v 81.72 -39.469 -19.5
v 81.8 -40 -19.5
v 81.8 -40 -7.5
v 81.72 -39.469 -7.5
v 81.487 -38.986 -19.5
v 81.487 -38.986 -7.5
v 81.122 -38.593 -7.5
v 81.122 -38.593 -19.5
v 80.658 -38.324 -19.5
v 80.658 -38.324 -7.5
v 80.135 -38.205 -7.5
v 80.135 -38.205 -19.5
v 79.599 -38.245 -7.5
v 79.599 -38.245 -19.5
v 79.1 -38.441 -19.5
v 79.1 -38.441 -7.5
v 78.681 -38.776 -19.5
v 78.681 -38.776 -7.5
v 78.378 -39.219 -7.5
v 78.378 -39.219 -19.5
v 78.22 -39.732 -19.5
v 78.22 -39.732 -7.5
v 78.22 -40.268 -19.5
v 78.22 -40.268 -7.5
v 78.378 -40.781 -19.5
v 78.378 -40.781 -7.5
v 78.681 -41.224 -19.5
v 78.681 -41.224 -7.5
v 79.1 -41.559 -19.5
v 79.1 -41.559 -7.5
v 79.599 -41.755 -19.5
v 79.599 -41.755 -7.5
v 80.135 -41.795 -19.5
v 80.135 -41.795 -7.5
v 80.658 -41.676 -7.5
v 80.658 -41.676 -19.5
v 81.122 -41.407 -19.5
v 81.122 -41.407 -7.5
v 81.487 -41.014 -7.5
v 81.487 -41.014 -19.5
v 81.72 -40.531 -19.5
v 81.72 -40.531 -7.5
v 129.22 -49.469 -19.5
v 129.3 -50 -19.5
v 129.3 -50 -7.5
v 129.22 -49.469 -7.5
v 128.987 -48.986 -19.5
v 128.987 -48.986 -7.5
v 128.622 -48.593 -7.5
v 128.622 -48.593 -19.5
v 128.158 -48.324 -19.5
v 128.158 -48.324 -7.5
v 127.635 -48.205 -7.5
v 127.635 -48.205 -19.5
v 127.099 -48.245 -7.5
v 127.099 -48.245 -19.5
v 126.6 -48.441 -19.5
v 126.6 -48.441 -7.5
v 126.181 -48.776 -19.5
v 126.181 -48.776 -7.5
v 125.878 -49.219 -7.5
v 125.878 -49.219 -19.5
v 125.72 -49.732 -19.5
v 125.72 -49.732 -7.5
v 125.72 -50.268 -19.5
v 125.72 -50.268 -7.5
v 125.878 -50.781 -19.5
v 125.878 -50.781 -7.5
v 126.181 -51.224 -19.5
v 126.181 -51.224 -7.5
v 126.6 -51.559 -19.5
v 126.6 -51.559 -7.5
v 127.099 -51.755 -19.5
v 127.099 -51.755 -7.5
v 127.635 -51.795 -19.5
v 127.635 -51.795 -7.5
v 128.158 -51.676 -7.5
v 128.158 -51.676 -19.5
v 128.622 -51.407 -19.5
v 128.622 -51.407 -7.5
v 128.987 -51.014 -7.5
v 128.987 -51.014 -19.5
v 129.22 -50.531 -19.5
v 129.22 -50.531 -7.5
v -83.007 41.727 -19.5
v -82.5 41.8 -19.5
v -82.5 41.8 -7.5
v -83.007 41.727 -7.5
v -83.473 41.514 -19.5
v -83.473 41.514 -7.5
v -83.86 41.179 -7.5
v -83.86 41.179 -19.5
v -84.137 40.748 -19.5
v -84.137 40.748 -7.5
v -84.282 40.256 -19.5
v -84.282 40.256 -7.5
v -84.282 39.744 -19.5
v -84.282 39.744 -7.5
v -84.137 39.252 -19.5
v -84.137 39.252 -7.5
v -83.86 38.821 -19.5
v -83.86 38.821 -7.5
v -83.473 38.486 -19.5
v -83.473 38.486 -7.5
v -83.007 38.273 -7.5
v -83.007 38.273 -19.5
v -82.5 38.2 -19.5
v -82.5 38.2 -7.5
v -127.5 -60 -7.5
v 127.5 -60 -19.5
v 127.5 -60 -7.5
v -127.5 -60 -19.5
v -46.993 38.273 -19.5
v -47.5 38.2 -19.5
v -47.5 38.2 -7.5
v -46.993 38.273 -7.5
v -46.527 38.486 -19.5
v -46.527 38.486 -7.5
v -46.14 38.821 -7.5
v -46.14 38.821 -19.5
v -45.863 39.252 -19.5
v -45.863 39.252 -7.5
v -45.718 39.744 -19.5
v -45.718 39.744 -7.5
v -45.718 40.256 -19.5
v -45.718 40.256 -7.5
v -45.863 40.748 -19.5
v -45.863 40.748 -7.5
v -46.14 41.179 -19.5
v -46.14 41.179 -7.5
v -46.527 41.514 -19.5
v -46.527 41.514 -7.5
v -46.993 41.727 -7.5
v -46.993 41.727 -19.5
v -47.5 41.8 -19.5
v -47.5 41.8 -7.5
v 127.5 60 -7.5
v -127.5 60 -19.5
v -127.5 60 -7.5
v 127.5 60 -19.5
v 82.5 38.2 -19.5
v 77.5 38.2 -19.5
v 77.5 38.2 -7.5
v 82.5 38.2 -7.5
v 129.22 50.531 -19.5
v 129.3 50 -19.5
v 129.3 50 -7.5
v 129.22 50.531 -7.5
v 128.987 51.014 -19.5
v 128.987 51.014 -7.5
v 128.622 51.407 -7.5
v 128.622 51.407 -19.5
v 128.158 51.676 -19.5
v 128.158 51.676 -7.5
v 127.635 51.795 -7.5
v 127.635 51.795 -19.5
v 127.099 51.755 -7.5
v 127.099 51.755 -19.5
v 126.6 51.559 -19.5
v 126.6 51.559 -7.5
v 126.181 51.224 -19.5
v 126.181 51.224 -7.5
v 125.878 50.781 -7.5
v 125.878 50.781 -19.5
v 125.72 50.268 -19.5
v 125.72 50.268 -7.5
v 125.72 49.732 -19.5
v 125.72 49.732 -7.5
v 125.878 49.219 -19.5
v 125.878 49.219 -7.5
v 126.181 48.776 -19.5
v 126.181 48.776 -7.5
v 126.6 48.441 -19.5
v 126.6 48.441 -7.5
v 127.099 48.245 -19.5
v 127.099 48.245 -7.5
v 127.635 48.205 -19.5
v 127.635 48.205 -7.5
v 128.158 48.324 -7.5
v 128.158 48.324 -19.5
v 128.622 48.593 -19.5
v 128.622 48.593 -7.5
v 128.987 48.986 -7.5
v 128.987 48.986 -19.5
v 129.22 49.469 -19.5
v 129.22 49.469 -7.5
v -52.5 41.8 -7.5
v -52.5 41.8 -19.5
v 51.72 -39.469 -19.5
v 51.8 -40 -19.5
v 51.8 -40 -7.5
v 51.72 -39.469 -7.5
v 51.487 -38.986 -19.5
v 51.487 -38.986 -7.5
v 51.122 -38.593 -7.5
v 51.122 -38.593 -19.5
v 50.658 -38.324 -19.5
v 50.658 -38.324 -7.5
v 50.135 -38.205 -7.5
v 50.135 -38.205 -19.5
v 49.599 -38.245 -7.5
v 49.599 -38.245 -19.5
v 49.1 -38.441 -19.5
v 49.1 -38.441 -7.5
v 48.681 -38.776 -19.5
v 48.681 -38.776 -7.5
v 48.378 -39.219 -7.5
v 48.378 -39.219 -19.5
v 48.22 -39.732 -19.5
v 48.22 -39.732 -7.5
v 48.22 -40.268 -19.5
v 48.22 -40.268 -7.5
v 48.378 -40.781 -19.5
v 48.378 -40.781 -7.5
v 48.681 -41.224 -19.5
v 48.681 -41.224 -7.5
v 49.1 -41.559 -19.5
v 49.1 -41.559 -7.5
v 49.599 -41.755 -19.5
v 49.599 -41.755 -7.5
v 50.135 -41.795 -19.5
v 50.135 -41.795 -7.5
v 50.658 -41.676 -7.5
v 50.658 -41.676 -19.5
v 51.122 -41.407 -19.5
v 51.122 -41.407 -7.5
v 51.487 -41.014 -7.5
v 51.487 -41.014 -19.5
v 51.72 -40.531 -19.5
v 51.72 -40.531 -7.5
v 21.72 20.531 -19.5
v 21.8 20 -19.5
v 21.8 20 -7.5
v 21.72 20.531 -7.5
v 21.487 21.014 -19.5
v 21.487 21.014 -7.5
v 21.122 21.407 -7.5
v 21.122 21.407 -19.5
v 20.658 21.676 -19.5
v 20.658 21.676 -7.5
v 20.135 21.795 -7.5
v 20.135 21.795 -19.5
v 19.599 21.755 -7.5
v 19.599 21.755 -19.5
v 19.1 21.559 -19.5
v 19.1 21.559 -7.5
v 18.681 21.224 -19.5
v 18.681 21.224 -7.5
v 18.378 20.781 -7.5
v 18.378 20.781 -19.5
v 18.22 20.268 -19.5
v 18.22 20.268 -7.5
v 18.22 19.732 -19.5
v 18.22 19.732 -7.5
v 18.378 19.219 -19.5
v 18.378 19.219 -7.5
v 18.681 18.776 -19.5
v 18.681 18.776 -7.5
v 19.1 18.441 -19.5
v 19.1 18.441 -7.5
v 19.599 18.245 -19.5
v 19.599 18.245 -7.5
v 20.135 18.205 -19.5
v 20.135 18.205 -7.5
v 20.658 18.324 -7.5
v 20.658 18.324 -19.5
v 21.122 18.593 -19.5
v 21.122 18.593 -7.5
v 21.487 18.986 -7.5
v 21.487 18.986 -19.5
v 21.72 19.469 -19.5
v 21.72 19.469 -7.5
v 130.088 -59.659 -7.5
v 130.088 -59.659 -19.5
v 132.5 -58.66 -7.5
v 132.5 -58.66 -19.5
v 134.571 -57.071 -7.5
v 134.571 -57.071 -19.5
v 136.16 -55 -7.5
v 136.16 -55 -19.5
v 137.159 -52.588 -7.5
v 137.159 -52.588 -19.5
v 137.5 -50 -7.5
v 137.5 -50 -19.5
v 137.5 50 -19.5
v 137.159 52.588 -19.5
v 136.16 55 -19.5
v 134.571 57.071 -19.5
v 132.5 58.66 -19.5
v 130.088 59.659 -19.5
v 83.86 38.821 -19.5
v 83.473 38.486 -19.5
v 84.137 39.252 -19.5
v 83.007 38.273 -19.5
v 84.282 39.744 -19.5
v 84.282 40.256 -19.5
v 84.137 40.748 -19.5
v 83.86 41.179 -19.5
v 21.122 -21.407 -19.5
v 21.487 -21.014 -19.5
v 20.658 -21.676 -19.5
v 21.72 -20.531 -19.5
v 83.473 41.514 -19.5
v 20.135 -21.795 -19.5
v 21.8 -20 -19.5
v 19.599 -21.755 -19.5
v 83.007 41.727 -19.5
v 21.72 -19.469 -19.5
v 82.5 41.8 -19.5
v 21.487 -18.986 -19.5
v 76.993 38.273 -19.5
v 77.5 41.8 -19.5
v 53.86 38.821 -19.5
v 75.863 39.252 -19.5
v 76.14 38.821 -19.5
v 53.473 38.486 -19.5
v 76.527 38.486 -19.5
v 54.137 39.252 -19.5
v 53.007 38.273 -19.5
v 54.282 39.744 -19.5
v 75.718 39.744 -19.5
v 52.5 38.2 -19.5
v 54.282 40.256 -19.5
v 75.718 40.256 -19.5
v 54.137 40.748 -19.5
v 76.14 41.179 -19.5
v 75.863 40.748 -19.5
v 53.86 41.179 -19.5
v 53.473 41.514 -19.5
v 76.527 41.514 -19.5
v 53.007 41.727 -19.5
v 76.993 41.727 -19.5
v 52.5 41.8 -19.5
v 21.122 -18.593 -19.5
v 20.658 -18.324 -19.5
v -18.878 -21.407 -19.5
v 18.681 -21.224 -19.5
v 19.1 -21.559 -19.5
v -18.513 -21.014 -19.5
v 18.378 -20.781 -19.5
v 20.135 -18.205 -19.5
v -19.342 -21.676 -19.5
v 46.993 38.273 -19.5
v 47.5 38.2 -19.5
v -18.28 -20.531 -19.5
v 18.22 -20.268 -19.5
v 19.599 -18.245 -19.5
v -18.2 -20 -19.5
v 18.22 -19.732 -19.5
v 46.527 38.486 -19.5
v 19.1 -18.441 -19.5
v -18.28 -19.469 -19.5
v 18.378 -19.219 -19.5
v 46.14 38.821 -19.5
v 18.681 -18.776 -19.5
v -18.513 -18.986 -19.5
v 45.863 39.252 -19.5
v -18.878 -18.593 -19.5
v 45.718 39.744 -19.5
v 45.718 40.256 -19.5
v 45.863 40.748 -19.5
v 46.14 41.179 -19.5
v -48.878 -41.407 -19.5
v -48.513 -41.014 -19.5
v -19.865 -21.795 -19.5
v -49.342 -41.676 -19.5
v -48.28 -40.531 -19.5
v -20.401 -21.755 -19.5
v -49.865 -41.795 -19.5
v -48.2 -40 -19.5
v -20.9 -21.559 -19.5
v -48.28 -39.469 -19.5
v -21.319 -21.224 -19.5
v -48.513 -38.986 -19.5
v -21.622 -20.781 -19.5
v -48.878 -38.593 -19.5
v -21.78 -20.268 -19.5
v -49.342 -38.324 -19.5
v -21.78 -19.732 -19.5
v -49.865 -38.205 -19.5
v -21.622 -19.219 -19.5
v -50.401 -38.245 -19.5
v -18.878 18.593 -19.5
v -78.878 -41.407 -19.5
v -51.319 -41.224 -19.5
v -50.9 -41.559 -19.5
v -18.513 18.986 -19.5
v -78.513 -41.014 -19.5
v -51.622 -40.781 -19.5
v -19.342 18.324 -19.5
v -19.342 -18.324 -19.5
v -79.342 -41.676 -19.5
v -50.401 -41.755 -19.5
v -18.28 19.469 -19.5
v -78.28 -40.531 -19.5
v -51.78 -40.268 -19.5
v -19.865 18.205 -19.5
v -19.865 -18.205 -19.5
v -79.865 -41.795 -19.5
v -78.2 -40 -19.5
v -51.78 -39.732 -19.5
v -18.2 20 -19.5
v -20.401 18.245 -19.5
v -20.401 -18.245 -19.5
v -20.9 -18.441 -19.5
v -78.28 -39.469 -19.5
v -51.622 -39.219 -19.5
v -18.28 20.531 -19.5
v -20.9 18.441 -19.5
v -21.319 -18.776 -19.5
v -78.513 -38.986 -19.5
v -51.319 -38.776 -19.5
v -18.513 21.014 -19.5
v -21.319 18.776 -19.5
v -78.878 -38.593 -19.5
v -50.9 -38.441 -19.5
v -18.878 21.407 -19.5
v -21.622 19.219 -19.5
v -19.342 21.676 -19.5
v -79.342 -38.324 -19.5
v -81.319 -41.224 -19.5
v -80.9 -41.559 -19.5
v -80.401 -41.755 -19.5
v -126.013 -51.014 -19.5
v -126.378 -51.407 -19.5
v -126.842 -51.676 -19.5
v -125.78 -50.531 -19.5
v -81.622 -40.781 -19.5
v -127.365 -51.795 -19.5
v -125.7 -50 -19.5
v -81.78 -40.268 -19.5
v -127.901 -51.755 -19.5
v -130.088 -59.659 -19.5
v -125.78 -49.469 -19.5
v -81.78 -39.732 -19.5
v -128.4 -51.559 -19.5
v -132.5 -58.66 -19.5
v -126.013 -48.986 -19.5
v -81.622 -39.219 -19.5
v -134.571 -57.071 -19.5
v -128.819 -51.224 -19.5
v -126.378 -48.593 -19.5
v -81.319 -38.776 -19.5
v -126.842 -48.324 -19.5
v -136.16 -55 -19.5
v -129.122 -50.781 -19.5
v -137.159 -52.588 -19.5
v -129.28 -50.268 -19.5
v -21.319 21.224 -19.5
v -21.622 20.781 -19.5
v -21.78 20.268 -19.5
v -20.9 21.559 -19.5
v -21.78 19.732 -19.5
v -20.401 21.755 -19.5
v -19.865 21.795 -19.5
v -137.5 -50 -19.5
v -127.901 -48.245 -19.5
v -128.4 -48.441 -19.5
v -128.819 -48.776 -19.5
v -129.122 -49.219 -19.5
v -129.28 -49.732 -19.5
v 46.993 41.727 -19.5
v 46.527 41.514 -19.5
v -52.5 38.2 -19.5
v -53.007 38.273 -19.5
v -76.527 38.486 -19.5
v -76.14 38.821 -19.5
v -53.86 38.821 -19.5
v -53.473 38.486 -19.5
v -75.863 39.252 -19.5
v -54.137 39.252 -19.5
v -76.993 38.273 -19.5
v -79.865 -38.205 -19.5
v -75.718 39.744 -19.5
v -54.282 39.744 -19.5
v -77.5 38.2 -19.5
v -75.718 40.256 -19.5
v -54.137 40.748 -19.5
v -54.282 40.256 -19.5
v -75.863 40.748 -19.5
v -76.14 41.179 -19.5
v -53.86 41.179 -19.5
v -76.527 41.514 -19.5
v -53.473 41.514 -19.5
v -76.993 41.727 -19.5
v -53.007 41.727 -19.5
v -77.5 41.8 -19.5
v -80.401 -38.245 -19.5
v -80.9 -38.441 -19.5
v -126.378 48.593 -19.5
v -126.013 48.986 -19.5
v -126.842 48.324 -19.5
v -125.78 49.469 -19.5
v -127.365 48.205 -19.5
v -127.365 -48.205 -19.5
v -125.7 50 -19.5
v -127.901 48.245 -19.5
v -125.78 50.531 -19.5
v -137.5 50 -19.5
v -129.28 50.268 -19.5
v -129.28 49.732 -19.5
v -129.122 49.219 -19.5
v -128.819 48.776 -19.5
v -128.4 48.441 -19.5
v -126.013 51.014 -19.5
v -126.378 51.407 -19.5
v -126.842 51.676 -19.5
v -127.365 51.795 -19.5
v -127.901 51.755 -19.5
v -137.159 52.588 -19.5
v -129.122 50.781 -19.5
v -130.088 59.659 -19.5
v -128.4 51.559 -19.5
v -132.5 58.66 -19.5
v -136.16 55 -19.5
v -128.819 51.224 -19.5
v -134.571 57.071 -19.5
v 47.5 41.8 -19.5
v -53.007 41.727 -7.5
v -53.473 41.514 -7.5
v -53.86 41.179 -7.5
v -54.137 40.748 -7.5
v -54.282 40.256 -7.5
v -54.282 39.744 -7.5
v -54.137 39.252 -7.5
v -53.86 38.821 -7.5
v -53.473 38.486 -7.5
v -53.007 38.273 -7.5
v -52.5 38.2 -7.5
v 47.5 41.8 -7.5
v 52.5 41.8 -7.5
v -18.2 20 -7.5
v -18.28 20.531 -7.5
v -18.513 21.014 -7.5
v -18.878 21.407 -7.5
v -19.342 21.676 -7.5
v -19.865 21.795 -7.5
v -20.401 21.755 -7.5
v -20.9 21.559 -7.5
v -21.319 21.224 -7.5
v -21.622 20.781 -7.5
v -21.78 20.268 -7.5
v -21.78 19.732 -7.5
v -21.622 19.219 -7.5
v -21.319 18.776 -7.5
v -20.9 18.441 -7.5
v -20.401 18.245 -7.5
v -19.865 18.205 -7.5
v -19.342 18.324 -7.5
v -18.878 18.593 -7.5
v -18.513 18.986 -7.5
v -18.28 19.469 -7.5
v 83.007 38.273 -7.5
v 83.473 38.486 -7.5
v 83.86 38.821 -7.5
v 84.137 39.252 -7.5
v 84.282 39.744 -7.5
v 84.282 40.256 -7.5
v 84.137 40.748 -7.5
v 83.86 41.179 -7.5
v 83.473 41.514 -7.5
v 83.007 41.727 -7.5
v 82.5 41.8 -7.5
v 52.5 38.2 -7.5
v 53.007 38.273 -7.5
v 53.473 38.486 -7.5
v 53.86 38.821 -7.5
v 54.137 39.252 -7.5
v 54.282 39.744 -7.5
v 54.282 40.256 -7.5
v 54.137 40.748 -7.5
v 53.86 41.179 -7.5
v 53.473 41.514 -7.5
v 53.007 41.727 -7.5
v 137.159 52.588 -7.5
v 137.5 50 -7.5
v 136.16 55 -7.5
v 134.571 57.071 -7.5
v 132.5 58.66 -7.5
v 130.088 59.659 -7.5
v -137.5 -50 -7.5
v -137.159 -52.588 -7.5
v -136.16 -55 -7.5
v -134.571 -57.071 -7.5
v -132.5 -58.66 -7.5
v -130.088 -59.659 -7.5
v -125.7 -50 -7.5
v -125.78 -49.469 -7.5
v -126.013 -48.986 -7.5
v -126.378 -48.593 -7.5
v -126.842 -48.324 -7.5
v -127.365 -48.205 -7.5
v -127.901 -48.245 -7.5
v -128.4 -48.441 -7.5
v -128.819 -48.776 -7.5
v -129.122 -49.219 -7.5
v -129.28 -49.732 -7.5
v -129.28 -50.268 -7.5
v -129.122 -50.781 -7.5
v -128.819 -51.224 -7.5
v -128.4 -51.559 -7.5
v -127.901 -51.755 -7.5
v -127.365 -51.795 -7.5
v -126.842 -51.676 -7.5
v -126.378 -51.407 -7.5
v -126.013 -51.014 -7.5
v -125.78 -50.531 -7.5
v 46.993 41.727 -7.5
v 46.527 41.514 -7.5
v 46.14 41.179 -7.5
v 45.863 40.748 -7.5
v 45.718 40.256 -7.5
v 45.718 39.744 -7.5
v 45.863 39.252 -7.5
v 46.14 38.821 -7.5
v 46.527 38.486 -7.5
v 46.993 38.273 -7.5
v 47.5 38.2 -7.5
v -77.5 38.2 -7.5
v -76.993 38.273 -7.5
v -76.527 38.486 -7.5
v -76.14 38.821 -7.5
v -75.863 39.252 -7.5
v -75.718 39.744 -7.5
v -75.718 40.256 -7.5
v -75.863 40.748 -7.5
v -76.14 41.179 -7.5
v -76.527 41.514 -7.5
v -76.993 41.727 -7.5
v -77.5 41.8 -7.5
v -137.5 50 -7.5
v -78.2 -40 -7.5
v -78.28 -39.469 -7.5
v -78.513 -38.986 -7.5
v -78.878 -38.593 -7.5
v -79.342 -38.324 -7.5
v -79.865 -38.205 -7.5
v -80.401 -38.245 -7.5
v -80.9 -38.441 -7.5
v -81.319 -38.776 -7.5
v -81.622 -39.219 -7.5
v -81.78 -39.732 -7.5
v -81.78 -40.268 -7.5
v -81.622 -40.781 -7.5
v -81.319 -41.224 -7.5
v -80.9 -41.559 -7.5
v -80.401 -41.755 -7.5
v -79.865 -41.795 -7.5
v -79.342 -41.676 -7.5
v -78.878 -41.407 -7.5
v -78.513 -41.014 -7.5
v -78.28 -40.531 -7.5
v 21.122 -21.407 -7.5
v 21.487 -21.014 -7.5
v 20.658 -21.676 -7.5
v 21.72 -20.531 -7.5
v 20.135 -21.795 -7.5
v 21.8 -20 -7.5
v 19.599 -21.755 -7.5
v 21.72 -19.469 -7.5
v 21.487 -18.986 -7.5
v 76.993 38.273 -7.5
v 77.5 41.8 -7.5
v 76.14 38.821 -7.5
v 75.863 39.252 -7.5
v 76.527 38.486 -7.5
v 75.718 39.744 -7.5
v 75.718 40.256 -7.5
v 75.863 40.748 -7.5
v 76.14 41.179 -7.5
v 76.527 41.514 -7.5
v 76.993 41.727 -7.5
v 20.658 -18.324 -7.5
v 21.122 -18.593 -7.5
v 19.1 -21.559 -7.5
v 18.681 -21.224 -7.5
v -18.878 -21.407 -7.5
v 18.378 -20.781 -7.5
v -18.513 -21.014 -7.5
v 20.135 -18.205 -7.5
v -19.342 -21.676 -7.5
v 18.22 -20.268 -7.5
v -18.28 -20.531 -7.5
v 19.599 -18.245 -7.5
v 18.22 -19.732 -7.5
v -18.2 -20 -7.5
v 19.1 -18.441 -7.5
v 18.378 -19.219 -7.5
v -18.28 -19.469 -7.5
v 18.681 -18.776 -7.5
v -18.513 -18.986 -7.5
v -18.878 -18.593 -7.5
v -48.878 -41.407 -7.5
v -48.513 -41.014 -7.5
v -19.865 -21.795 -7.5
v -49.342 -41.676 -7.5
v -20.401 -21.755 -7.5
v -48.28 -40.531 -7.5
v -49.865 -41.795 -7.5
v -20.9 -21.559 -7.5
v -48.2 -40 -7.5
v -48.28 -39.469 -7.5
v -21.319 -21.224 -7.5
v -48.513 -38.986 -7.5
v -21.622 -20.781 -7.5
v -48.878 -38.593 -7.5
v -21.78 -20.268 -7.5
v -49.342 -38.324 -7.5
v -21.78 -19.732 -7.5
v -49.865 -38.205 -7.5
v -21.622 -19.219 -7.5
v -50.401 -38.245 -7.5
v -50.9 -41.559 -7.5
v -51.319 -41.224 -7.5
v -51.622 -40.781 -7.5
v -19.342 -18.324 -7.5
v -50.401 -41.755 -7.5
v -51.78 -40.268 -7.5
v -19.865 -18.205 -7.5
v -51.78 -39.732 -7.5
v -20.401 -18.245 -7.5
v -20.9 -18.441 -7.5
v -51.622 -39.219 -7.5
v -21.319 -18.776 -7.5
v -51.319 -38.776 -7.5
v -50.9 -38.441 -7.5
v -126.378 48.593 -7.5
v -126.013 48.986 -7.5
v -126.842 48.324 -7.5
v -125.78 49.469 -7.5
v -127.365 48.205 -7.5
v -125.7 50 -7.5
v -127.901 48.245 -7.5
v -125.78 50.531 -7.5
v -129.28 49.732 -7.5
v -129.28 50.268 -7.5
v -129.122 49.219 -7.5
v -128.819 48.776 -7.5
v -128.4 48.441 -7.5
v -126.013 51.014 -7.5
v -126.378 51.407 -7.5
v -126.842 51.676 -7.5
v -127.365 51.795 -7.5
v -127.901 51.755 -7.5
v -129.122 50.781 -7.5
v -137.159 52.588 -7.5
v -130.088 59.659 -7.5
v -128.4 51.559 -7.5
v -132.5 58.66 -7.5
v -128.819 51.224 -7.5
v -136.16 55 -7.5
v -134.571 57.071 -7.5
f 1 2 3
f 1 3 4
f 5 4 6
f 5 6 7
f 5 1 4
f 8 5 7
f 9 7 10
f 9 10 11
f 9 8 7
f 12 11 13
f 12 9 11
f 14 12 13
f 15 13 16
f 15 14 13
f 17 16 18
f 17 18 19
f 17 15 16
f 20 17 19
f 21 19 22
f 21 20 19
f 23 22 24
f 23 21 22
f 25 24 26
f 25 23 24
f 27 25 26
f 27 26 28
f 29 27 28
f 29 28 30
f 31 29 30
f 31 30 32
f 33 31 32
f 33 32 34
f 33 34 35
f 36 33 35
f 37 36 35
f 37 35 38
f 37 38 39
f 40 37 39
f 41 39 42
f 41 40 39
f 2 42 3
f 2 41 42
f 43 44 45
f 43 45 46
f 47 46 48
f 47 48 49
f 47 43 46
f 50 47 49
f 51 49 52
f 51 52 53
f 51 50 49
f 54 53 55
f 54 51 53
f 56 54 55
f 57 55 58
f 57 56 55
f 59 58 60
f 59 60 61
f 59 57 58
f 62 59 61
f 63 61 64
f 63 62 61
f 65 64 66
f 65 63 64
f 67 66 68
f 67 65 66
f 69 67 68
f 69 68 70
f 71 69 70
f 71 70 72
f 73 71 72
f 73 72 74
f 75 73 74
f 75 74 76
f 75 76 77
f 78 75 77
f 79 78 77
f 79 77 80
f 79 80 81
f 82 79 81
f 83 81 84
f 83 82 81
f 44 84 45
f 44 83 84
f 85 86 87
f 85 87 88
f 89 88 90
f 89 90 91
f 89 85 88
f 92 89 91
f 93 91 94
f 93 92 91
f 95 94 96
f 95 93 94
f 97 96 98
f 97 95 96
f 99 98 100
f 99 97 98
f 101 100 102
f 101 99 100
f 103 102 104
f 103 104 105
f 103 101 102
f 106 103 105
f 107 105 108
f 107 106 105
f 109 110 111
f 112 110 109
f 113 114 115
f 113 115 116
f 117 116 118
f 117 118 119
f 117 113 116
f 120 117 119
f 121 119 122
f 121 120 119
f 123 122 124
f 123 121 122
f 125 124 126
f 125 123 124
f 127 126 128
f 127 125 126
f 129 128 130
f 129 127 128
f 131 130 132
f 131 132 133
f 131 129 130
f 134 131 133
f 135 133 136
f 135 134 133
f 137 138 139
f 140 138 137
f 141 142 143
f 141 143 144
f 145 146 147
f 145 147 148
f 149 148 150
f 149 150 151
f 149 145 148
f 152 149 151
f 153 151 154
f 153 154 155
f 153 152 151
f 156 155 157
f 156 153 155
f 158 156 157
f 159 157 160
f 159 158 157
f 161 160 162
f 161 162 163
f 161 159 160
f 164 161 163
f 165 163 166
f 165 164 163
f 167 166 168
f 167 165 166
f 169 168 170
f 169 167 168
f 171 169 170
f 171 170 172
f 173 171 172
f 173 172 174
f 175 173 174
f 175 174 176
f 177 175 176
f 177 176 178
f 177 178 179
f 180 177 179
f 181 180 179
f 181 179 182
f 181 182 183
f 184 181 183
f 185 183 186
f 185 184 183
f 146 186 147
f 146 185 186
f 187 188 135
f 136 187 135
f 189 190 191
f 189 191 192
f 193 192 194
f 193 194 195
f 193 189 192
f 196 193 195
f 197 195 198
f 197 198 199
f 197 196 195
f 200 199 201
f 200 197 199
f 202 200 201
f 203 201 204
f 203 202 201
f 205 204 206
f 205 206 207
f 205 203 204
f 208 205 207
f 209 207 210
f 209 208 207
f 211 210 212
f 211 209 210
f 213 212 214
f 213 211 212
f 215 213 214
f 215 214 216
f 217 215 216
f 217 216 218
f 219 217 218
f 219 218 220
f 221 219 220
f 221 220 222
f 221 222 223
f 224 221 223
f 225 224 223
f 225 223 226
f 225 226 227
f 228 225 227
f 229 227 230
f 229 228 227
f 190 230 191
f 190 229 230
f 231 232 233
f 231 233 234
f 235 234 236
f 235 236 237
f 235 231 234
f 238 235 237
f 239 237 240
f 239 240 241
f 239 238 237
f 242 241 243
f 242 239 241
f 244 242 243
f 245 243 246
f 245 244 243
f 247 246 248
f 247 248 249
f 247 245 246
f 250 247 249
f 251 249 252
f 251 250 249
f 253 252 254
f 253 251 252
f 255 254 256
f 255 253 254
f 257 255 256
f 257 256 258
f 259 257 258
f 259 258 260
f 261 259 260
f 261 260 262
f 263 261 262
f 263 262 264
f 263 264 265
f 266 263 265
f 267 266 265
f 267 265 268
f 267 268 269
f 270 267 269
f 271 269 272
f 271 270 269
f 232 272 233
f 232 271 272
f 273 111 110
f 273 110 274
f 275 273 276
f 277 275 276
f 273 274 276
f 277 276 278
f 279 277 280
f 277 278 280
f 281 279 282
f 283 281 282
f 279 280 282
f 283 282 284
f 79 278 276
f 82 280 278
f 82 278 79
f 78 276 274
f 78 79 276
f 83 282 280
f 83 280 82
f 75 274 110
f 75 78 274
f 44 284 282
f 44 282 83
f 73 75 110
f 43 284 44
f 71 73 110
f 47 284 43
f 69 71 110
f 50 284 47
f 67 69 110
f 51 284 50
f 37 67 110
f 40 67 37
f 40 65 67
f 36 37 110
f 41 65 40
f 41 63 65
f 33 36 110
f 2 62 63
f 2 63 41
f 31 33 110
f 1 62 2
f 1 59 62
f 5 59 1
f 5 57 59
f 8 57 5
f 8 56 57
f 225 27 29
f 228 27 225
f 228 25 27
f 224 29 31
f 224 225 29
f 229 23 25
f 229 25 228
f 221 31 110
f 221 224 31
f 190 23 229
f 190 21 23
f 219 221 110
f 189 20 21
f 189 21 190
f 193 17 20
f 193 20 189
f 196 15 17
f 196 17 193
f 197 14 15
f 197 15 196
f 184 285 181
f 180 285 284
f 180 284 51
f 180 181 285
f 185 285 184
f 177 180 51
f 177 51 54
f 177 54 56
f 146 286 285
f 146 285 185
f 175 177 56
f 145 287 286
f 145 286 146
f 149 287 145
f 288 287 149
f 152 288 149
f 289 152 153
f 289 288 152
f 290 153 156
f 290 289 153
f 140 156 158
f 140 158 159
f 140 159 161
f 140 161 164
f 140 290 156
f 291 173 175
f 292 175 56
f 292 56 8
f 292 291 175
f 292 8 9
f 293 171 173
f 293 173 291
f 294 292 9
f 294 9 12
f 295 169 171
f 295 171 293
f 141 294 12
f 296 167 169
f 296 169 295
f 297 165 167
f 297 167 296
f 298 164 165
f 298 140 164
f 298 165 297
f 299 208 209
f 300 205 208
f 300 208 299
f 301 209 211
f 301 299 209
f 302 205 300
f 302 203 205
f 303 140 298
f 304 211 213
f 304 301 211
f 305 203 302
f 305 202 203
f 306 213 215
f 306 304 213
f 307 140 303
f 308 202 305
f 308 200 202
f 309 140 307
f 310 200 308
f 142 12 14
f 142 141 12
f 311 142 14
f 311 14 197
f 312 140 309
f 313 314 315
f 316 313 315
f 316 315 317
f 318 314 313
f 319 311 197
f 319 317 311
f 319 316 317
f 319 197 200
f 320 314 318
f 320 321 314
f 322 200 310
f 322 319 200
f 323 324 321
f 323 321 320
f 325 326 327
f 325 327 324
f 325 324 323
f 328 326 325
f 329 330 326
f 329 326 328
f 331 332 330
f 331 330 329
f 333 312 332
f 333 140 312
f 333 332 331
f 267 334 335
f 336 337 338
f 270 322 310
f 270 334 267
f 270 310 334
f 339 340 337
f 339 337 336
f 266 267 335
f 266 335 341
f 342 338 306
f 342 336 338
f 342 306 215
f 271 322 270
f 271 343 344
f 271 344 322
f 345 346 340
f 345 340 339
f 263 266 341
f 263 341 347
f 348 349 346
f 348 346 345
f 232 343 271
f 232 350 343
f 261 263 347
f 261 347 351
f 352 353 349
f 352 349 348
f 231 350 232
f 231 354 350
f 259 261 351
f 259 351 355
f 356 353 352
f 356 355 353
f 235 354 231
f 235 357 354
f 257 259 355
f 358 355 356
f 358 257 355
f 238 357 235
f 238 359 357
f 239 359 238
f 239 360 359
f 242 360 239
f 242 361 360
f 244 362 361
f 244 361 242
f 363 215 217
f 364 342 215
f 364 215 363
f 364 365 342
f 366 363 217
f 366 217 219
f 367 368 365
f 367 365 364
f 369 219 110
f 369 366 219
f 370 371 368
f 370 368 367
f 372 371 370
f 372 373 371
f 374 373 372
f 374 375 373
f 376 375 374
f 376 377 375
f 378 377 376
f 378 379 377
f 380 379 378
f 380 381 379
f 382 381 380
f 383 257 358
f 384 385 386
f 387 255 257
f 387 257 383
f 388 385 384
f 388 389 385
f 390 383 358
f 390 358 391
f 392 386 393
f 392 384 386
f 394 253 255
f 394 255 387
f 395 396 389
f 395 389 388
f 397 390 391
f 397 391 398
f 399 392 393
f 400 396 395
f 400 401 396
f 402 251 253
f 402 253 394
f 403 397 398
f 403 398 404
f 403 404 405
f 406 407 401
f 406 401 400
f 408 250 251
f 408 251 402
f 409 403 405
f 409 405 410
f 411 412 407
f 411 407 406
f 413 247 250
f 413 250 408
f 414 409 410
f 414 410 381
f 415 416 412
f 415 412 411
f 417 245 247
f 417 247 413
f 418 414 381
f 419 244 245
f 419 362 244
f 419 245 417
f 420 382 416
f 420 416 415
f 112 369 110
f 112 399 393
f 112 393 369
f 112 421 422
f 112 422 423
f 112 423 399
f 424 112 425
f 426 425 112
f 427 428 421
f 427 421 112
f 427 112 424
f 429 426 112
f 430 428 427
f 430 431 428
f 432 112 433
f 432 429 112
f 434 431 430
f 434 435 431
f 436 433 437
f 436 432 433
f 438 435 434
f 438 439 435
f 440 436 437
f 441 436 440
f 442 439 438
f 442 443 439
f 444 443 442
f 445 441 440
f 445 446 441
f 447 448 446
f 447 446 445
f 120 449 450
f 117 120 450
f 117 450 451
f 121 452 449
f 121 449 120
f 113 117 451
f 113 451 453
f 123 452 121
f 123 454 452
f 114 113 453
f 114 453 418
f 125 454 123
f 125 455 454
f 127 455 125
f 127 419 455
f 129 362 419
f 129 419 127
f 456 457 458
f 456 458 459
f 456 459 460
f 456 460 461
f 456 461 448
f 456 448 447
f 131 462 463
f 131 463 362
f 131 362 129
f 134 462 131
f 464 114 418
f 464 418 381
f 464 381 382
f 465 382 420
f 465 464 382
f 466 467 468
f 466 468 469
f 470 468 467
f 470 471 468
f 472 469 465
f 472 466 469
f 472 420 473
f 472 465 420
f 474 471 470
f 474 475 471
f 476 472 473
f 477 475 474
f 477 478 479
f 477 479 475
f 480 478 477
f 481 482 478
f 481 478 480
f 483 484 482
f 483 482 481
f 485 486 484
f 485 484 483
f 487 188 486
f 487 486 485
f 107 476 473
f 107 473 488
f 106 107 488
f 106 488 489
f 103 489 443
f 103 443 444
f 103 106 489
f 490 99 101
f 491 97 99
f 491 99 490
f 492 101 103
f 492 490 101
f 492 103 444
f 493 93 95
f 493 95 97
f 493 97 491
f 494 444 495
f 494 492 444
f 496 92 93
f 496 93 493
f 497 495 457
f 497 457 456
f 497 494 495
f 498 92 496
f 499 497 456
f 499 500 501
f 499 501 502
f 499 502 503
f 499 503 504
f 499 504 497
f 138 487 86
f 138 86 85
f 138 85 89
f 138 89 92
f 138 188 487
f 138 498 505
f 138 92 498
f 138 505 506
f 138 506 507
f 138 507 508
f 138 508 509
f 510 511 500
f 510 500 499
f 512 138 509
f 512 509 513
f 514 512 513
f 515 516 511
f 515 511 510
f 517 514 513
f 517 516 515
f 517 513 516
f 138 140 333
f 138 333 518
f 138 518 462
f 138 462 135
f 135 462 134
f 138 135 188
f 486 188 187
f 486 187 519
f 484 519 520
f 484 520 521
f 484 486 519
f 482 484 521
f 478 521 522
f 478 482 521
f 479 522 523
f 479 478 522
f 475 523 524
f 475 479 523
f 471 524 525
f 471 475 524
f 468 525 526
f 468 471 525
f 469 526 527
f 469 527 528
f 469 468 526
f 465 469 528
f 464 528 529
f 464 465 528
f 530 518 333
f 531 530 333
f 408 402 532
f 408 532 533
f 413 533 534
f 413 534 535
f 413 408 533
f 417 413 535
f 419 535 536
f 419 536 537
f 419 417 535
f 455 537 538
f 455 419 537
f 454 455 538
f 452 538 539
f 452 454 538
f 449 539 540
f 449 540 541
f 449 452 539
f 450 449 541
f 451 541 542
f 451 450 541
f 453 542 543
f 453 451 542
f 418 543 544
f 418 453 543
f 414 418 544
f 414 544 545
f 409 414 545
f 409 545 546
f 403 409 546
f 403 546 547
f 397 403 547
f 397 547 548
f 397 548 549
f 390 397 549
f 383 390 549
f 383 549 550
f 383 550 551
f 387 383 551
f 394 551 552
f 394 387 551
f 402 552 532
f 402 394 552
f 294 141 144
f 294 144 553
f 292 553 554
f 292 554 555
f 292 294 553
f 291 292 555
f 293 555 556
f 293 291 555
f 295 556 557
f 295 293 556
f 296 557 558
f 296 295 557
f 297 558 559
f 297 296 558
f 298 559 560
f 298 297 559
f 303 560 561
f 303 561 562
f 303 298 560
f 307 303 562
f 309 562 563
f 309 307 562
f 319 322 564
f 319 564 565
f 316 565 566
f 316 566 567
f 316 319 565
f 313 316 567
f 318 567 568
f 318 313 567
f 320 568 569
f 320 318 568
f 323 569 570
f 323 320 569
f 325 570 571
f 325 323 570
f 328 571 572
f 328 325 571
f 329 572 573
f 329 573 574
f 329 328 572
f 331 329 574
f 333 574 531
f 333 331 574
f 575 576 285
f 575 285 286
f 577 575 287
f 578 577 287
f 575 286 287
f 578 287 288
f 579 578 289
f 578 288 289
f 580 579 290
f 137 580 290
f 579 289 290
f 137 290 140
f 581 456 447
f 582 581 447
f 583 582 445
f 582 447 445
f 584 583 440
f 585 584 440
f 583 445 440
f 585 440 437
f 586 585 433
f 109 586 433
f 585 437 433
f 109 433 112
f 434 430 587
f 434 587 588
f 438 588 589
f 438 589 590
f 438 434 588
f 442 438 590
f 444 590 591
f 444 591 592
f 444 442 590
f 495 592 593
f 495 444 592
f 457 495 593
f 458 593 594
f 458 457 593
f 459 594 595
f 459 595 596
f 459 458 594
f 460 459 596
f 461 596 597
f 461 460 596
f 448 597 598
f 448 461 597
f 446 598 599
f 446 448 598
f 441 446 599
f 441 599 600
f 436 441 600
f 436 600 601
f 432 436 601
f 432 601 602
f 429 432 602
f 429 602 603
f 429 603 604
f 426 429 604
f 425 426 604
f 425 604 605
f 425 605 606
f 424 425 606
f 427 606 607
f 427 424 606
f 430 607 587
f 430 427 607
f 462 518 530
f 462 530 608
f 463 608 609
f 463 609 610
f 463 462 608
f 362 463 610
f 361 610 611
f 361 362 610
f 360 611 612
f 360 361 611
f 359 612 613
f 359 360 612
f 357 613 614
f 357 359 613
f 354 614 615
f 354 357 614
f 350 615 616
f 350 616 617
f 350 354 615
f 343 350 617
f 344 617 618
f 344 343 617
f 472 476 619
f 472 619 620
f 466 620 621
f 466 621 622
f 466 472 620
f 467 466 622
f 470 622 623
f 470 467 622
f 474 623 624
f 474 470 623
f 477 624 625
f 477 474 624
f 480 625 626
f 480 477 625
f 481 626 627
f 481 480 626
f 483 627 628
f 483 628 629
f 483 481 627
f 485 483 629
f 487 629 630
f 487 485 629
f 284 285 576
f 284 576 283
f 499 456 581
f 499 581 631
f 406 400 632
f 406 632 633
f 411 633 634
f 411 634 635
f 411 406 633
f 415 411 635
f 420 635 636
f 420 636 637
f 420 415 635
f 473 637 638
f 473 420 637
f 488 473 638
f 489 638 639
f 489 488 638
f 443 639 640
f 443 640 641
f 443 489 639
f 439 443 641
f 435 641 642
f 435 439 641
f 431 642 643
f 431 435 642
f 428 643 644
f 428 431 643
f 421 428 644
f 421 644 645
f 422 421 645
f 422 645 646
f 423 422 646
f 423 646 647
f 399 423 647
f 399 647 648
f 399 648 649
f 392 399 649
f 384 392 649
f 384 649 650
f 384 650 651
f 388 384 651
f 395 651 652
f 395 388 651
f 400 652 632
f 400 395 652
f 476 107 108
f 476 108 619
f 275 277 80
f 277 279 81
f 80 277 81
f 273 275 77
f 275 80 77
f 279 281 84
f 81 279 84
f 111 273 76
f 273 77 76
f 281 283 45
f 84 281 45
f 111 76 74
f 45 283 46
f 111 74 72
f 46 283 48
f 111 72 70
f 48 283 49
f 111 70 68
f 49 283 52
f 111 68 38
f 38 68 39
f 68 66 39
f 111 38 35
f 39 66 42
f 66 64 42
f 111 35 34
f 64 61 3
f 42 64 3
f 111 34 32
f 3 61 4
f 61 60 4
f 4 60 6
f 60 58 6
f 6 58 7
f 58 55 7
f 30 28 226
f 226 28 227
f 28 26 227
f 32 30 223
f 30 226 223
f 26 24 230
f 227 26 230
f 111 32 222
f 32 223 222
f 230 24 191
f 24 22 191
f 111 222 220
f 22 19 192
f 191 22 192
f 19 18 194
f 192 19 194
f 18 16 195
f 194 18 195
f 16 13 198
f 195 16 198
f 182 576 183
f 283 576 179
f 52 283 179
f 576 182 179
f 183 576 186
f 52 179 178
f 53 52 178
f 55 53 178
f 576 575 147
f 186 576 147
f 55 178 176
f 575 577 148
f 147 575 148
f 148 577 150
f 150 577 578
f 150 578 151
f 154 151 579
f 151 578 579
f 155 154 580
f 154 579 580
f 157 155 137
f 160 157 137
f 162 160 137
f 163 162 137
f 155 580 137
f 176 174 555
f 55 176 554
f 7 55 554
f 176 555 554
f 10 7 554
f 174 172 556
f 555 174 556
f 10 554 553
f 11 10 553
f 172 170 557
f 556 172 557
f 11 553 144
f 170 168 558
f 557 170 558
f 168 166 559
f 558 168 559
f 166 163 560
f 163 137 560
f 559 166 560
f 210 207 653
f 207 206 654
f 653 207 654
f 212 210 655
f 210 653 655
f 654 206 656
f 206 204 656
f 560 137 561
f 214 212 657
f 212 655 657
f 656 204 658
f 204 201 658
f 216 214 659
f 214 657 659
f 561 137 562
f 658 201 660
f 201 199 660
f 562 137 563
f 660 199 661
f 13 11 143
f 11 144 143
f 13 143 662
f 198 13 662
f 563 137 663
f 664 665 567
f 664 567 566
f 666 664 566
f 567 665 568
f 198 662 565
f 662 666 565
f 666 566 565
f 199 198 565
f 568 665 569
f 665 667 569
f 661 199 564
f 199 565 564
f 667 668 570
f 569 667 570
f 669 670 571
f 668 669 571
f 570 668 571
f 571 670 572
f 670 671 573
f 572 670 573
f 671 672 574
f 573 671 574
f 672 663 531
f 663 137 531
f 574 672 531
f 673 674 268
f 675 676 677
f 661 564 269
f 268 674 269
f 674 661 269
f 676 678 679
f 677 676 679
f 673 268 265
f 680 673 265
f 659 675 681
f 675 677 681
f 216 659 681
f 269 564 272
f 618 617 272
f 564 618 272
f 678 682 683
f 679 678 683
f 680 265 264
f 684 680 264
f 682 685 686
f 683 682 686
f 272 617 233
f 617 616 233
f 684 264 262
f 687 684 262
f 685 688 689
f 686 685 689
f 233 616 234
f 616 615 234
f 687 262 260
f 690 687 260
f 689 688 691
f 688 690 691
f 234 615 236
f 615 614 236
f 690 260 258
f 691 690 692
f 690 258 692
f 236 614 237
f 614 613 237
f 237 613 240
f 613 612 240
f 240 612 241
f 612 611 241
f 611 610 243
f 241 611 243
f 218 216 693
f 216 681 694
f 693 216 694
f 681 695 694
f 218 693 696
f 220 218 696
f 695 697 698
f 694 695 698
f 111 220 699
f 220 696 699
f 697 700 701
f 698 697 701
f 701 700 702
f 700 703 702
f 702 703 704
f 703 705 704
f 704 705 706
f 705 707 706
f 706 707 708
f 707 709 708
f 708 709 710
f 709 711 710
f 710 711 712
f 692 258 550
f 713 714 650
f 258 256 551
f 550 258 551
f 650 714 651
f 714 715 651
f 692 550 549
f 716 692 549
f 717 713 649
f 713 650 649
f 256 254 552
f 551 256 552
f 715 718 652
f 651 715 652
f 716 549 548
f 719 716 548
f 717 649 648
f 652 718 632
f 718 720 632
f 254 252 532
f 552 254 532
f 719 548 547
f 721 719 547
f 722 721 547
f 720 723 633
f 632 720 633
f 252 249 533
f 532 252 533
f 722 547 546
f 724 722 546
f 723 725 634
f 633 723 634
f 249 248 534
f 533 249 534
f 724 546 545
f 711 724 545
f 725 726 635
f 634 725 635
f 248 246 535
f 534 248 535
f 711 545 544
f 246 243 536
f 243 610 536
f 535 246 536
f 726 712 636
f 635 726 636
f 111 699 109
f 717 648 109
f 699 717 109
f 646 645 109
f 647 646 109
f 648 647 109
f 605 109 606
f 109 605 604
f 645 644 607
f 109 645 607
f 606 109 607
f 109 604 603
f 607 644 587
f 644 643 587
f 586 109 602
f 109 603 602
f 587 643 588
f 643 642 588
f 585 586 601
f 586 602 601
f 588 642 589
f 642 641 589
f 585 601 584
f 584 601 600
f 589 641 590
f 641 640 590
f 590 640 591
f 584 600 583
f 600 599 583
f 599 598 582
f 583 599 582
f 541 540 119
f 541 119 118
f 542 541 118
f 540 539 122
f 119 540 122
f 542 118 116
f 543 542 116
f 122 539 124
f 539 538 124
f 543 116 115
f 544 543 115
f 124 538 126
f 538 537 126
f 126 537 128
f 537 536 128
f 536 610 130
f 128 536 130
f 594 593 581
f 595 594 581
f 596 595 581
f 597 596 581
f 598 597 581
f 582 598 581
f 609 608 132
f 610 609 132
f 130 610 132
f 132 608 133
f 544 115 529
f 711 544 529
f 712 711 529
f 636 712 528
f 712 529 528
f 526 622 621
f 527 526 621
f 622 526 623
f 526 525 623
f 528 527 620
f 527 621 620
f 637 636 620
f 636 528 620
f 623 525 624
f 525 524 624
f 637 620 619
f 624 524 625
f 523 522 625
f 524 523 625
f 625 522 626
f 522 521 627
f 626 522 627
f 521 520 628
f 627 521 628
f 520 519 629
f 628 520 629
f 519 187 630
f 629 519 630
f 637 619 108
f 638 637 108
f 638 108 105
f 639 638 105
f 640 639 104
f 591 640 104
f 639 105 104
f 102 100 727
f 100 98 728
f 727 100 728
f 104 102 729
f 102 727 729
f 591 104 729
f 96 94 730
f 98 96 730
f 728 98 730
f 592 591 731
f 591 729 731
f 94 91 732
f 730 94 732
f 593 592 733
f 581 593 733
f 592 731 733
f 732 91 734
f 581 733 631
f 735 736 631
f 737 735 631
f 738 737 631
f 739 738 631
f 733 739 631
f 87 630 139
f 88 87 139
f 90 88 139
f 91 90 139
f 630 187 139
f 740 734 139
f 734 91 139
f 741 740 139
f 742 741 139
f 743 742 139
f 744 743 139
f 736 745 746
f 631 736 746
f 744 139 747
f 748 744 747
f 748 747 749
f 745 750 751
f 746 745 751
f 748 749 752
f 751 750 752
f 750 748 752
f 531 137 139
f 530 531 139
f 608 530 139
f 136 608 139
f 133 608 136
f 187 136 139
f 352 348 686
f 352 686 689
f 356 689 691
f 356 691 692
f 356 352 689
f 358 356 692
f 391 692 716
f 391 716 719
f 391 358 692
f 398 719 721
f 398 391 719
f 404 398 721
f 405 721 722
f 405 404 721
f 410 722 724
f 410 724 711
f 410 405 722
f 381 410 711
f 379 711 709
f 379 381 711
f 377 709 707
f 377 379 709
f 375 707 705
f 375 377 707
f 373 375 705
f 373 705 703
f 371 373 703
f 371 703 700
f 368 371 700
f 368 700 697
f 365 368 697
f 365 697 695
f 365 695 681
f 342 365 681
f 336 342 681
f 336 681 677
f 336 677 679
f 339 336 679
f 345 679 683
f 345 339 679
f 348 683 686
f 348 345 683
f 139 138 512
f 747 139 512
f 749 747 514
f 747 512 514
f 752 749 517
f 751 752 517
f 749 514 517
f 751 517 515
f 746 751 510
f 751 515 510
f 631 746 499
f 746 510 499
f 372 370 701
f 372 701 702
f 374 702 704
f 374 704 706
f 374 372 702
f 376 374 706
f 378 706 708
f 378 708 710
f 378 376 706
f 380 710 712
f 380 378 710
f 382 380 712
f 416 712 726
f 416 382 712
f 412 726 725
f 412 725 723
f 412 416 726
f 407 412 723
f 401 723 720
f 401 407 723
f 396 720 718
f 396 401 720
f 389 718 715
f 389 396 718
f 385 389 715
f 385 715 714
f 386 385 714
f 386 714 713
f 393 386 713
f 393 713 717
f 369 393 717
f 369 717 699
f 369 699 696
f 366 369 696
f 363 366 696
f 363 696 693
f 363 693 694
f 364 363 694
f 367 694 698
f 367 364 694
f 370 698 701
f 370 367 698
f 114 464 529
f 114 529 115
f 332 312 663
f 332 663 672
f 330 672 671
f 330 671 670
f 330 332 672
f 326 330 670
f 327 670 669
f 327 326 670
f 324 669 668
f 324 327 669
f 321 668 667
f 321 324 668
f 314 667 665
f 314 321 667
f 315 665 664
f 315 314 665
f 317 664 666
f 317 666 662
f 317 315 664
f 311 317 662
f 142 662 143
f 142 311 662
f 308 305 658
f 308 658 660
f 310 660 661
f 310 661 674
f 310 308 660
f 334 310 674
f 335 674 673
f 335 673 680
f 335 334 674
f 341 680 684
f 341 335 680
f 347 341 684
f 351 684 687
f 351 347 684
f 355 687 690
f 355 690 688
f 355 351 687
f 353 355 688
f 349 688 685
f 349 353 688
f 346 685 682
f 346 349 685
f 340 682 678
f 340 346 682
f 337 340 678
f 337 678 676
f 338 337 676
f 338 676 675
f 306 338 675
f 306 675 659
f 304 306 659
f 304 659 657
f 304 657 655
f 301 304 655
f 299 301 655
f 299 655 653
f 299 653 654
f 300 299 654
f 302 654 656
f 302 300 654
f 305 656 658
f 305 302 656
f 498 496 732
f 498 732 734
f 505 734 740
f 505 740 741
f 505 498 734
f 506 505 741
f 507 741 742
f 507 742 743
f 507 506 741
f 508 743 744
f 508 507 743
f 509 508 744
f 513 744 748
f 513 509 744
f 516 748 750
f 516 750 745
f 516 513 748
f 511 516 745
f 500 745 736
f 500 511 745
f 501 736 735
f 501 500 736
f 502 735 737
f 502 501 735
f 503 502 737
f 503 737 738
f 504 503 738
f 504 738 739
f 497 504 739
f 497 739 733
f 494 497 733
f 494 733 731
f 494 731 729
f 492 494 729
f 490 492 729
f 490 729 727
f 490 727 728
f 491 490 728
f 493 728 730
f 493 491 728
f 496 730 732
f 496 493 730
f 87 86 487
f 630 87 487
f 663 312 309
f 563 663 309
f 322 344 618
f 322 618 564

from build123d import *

# Parameters (mm, degrees)
SKETCH001_R  = 1.8
PAD001_DEPTH = 12


with BuildPart() as part:
    # Sketch001 → Pad001 (new body)
    with BuildSketch(Plane.XY.offset(-19.5)):
        with BuildLine():
            Line((-127.5, 60), (127.5, 60))
            ThreePointArc((137.5, 49.999999), (134.571068, 57.071067), (127.5, 60))
            Line((137.5, 49.999999), (137.5, -49.999999))
            ThreePointArc((127.5, -60), (134.571068, -57.071067), (137.5, -49.999999))
            Line((127.5, -60), (-127.5, -60))
            ThreePointArc((-137.5, -50), (-134.571068, -57.071067), (-127.5, -60))
            Line((-137.5, -50), (-137.5, 50))
            ThreePointArc((-127.5, 60), (-134.571068, 57.071068), (-137.5, 50))
        make_face()
        with Locations((-80, -40)):
            Circle(SKETCH001_R, mode=Mode.SUBTRACT)
        with Locations((-50, -40)):
            Circle(SKETCH001_R, mode=Mode.SUBTRACT)
        with Locations((50, -40)):
            Circle(SKETCH001_R, mode=Mode.SUBTRACT)
        with Locations((80, -40)):
            Circle(SKETCH001_R, mode=Mode.SUBTRACT)
        with Locations((-127.5, -50)):
            Circle(SKETCH001_R, mode=Mode.SUBTRACT)
        with Locations((-127.5, 50)):
            Circle(SKETCH001_R, mode=Mode.SUBTRACT)
        with Locations((127.5, 50)):
            Circle(SKETCH001_R, mode=Mode.SUBTRACT)
        with Locations((127.5, -50)):
            Circle(SKETCH001_R, mode=Mode.SUBTRACT)
        with Locations((-20, 20)):
            Circle(SKETCH001_R, mode=Mode.SUBTRACT)
        with Locations((20, 20)):
            Circle(SKETCH001_R, mode=Mode.SUBTRACT)
        with Locations((-20, -20)):
            Circle(SKETCH001_R, mode=Mode.SUBTRACT)
        with Locations((20, -20)):
            Circle(SKETCH001_R, mode=Mode.SUBTRACT)
        with BuildLine():
            ThreePointArc((-82.5, 41.8), (-84.3, 40), (-82.5, 38.2))
            Line((-82.5, 38.2), (-77.5, 38.2))
            ThreePointArc((-77.5, 38.2), (-75.7, 40), (-77.5, 41.8))
            Line((-82.5, 41.8), (-77.5, 41.8))
        make_face(mode=Mode.SUBTRACT)
        with BuildLine():
            ThreePointArc((-52.5, 41.8), (-54.3, 40), (-52.5, 38.2))
            Line((-52.5, 38.2), (-47.5, 38.2))
            ThreePointArc((-47.5, 38.2), (-45.7, 40), (-47.5, 41.8))
            Line((-52.5, 41.8), (-47.5, 41.8))
        make_face(mode=Mode.SUBTRACT)
        with BuildLine():
            ThreePointArc((47.5, 41.8), (45.7, 40), (47.5, 38.2))
            Line((47.5, 38.2), (52.5, 38.2))
            ThreePointArc((52.5, 38.2), (54.3, 40), (52.5, 41.8))
            Line((47.5, 41.8), (52.5, 41.8))
        make_face(mode=Mode.SUBTRACT)
        with BuildLine():
            ThreePointArc((77.5, 41.8), (75.7, 40), (77.5, 38.2))
            Line((77.5, 38.2), (82.5, 38.2))
            ThreePointArc((82.5, 38.2), (84.3, 40), (82.5, 41.8))
            Line((77.5, 41.8), (82.5, 41.8))
        make_face(mode=Mode.SUBTRACT)
    extrude(amount=PAD001_DEPTH)


solid = part.part
